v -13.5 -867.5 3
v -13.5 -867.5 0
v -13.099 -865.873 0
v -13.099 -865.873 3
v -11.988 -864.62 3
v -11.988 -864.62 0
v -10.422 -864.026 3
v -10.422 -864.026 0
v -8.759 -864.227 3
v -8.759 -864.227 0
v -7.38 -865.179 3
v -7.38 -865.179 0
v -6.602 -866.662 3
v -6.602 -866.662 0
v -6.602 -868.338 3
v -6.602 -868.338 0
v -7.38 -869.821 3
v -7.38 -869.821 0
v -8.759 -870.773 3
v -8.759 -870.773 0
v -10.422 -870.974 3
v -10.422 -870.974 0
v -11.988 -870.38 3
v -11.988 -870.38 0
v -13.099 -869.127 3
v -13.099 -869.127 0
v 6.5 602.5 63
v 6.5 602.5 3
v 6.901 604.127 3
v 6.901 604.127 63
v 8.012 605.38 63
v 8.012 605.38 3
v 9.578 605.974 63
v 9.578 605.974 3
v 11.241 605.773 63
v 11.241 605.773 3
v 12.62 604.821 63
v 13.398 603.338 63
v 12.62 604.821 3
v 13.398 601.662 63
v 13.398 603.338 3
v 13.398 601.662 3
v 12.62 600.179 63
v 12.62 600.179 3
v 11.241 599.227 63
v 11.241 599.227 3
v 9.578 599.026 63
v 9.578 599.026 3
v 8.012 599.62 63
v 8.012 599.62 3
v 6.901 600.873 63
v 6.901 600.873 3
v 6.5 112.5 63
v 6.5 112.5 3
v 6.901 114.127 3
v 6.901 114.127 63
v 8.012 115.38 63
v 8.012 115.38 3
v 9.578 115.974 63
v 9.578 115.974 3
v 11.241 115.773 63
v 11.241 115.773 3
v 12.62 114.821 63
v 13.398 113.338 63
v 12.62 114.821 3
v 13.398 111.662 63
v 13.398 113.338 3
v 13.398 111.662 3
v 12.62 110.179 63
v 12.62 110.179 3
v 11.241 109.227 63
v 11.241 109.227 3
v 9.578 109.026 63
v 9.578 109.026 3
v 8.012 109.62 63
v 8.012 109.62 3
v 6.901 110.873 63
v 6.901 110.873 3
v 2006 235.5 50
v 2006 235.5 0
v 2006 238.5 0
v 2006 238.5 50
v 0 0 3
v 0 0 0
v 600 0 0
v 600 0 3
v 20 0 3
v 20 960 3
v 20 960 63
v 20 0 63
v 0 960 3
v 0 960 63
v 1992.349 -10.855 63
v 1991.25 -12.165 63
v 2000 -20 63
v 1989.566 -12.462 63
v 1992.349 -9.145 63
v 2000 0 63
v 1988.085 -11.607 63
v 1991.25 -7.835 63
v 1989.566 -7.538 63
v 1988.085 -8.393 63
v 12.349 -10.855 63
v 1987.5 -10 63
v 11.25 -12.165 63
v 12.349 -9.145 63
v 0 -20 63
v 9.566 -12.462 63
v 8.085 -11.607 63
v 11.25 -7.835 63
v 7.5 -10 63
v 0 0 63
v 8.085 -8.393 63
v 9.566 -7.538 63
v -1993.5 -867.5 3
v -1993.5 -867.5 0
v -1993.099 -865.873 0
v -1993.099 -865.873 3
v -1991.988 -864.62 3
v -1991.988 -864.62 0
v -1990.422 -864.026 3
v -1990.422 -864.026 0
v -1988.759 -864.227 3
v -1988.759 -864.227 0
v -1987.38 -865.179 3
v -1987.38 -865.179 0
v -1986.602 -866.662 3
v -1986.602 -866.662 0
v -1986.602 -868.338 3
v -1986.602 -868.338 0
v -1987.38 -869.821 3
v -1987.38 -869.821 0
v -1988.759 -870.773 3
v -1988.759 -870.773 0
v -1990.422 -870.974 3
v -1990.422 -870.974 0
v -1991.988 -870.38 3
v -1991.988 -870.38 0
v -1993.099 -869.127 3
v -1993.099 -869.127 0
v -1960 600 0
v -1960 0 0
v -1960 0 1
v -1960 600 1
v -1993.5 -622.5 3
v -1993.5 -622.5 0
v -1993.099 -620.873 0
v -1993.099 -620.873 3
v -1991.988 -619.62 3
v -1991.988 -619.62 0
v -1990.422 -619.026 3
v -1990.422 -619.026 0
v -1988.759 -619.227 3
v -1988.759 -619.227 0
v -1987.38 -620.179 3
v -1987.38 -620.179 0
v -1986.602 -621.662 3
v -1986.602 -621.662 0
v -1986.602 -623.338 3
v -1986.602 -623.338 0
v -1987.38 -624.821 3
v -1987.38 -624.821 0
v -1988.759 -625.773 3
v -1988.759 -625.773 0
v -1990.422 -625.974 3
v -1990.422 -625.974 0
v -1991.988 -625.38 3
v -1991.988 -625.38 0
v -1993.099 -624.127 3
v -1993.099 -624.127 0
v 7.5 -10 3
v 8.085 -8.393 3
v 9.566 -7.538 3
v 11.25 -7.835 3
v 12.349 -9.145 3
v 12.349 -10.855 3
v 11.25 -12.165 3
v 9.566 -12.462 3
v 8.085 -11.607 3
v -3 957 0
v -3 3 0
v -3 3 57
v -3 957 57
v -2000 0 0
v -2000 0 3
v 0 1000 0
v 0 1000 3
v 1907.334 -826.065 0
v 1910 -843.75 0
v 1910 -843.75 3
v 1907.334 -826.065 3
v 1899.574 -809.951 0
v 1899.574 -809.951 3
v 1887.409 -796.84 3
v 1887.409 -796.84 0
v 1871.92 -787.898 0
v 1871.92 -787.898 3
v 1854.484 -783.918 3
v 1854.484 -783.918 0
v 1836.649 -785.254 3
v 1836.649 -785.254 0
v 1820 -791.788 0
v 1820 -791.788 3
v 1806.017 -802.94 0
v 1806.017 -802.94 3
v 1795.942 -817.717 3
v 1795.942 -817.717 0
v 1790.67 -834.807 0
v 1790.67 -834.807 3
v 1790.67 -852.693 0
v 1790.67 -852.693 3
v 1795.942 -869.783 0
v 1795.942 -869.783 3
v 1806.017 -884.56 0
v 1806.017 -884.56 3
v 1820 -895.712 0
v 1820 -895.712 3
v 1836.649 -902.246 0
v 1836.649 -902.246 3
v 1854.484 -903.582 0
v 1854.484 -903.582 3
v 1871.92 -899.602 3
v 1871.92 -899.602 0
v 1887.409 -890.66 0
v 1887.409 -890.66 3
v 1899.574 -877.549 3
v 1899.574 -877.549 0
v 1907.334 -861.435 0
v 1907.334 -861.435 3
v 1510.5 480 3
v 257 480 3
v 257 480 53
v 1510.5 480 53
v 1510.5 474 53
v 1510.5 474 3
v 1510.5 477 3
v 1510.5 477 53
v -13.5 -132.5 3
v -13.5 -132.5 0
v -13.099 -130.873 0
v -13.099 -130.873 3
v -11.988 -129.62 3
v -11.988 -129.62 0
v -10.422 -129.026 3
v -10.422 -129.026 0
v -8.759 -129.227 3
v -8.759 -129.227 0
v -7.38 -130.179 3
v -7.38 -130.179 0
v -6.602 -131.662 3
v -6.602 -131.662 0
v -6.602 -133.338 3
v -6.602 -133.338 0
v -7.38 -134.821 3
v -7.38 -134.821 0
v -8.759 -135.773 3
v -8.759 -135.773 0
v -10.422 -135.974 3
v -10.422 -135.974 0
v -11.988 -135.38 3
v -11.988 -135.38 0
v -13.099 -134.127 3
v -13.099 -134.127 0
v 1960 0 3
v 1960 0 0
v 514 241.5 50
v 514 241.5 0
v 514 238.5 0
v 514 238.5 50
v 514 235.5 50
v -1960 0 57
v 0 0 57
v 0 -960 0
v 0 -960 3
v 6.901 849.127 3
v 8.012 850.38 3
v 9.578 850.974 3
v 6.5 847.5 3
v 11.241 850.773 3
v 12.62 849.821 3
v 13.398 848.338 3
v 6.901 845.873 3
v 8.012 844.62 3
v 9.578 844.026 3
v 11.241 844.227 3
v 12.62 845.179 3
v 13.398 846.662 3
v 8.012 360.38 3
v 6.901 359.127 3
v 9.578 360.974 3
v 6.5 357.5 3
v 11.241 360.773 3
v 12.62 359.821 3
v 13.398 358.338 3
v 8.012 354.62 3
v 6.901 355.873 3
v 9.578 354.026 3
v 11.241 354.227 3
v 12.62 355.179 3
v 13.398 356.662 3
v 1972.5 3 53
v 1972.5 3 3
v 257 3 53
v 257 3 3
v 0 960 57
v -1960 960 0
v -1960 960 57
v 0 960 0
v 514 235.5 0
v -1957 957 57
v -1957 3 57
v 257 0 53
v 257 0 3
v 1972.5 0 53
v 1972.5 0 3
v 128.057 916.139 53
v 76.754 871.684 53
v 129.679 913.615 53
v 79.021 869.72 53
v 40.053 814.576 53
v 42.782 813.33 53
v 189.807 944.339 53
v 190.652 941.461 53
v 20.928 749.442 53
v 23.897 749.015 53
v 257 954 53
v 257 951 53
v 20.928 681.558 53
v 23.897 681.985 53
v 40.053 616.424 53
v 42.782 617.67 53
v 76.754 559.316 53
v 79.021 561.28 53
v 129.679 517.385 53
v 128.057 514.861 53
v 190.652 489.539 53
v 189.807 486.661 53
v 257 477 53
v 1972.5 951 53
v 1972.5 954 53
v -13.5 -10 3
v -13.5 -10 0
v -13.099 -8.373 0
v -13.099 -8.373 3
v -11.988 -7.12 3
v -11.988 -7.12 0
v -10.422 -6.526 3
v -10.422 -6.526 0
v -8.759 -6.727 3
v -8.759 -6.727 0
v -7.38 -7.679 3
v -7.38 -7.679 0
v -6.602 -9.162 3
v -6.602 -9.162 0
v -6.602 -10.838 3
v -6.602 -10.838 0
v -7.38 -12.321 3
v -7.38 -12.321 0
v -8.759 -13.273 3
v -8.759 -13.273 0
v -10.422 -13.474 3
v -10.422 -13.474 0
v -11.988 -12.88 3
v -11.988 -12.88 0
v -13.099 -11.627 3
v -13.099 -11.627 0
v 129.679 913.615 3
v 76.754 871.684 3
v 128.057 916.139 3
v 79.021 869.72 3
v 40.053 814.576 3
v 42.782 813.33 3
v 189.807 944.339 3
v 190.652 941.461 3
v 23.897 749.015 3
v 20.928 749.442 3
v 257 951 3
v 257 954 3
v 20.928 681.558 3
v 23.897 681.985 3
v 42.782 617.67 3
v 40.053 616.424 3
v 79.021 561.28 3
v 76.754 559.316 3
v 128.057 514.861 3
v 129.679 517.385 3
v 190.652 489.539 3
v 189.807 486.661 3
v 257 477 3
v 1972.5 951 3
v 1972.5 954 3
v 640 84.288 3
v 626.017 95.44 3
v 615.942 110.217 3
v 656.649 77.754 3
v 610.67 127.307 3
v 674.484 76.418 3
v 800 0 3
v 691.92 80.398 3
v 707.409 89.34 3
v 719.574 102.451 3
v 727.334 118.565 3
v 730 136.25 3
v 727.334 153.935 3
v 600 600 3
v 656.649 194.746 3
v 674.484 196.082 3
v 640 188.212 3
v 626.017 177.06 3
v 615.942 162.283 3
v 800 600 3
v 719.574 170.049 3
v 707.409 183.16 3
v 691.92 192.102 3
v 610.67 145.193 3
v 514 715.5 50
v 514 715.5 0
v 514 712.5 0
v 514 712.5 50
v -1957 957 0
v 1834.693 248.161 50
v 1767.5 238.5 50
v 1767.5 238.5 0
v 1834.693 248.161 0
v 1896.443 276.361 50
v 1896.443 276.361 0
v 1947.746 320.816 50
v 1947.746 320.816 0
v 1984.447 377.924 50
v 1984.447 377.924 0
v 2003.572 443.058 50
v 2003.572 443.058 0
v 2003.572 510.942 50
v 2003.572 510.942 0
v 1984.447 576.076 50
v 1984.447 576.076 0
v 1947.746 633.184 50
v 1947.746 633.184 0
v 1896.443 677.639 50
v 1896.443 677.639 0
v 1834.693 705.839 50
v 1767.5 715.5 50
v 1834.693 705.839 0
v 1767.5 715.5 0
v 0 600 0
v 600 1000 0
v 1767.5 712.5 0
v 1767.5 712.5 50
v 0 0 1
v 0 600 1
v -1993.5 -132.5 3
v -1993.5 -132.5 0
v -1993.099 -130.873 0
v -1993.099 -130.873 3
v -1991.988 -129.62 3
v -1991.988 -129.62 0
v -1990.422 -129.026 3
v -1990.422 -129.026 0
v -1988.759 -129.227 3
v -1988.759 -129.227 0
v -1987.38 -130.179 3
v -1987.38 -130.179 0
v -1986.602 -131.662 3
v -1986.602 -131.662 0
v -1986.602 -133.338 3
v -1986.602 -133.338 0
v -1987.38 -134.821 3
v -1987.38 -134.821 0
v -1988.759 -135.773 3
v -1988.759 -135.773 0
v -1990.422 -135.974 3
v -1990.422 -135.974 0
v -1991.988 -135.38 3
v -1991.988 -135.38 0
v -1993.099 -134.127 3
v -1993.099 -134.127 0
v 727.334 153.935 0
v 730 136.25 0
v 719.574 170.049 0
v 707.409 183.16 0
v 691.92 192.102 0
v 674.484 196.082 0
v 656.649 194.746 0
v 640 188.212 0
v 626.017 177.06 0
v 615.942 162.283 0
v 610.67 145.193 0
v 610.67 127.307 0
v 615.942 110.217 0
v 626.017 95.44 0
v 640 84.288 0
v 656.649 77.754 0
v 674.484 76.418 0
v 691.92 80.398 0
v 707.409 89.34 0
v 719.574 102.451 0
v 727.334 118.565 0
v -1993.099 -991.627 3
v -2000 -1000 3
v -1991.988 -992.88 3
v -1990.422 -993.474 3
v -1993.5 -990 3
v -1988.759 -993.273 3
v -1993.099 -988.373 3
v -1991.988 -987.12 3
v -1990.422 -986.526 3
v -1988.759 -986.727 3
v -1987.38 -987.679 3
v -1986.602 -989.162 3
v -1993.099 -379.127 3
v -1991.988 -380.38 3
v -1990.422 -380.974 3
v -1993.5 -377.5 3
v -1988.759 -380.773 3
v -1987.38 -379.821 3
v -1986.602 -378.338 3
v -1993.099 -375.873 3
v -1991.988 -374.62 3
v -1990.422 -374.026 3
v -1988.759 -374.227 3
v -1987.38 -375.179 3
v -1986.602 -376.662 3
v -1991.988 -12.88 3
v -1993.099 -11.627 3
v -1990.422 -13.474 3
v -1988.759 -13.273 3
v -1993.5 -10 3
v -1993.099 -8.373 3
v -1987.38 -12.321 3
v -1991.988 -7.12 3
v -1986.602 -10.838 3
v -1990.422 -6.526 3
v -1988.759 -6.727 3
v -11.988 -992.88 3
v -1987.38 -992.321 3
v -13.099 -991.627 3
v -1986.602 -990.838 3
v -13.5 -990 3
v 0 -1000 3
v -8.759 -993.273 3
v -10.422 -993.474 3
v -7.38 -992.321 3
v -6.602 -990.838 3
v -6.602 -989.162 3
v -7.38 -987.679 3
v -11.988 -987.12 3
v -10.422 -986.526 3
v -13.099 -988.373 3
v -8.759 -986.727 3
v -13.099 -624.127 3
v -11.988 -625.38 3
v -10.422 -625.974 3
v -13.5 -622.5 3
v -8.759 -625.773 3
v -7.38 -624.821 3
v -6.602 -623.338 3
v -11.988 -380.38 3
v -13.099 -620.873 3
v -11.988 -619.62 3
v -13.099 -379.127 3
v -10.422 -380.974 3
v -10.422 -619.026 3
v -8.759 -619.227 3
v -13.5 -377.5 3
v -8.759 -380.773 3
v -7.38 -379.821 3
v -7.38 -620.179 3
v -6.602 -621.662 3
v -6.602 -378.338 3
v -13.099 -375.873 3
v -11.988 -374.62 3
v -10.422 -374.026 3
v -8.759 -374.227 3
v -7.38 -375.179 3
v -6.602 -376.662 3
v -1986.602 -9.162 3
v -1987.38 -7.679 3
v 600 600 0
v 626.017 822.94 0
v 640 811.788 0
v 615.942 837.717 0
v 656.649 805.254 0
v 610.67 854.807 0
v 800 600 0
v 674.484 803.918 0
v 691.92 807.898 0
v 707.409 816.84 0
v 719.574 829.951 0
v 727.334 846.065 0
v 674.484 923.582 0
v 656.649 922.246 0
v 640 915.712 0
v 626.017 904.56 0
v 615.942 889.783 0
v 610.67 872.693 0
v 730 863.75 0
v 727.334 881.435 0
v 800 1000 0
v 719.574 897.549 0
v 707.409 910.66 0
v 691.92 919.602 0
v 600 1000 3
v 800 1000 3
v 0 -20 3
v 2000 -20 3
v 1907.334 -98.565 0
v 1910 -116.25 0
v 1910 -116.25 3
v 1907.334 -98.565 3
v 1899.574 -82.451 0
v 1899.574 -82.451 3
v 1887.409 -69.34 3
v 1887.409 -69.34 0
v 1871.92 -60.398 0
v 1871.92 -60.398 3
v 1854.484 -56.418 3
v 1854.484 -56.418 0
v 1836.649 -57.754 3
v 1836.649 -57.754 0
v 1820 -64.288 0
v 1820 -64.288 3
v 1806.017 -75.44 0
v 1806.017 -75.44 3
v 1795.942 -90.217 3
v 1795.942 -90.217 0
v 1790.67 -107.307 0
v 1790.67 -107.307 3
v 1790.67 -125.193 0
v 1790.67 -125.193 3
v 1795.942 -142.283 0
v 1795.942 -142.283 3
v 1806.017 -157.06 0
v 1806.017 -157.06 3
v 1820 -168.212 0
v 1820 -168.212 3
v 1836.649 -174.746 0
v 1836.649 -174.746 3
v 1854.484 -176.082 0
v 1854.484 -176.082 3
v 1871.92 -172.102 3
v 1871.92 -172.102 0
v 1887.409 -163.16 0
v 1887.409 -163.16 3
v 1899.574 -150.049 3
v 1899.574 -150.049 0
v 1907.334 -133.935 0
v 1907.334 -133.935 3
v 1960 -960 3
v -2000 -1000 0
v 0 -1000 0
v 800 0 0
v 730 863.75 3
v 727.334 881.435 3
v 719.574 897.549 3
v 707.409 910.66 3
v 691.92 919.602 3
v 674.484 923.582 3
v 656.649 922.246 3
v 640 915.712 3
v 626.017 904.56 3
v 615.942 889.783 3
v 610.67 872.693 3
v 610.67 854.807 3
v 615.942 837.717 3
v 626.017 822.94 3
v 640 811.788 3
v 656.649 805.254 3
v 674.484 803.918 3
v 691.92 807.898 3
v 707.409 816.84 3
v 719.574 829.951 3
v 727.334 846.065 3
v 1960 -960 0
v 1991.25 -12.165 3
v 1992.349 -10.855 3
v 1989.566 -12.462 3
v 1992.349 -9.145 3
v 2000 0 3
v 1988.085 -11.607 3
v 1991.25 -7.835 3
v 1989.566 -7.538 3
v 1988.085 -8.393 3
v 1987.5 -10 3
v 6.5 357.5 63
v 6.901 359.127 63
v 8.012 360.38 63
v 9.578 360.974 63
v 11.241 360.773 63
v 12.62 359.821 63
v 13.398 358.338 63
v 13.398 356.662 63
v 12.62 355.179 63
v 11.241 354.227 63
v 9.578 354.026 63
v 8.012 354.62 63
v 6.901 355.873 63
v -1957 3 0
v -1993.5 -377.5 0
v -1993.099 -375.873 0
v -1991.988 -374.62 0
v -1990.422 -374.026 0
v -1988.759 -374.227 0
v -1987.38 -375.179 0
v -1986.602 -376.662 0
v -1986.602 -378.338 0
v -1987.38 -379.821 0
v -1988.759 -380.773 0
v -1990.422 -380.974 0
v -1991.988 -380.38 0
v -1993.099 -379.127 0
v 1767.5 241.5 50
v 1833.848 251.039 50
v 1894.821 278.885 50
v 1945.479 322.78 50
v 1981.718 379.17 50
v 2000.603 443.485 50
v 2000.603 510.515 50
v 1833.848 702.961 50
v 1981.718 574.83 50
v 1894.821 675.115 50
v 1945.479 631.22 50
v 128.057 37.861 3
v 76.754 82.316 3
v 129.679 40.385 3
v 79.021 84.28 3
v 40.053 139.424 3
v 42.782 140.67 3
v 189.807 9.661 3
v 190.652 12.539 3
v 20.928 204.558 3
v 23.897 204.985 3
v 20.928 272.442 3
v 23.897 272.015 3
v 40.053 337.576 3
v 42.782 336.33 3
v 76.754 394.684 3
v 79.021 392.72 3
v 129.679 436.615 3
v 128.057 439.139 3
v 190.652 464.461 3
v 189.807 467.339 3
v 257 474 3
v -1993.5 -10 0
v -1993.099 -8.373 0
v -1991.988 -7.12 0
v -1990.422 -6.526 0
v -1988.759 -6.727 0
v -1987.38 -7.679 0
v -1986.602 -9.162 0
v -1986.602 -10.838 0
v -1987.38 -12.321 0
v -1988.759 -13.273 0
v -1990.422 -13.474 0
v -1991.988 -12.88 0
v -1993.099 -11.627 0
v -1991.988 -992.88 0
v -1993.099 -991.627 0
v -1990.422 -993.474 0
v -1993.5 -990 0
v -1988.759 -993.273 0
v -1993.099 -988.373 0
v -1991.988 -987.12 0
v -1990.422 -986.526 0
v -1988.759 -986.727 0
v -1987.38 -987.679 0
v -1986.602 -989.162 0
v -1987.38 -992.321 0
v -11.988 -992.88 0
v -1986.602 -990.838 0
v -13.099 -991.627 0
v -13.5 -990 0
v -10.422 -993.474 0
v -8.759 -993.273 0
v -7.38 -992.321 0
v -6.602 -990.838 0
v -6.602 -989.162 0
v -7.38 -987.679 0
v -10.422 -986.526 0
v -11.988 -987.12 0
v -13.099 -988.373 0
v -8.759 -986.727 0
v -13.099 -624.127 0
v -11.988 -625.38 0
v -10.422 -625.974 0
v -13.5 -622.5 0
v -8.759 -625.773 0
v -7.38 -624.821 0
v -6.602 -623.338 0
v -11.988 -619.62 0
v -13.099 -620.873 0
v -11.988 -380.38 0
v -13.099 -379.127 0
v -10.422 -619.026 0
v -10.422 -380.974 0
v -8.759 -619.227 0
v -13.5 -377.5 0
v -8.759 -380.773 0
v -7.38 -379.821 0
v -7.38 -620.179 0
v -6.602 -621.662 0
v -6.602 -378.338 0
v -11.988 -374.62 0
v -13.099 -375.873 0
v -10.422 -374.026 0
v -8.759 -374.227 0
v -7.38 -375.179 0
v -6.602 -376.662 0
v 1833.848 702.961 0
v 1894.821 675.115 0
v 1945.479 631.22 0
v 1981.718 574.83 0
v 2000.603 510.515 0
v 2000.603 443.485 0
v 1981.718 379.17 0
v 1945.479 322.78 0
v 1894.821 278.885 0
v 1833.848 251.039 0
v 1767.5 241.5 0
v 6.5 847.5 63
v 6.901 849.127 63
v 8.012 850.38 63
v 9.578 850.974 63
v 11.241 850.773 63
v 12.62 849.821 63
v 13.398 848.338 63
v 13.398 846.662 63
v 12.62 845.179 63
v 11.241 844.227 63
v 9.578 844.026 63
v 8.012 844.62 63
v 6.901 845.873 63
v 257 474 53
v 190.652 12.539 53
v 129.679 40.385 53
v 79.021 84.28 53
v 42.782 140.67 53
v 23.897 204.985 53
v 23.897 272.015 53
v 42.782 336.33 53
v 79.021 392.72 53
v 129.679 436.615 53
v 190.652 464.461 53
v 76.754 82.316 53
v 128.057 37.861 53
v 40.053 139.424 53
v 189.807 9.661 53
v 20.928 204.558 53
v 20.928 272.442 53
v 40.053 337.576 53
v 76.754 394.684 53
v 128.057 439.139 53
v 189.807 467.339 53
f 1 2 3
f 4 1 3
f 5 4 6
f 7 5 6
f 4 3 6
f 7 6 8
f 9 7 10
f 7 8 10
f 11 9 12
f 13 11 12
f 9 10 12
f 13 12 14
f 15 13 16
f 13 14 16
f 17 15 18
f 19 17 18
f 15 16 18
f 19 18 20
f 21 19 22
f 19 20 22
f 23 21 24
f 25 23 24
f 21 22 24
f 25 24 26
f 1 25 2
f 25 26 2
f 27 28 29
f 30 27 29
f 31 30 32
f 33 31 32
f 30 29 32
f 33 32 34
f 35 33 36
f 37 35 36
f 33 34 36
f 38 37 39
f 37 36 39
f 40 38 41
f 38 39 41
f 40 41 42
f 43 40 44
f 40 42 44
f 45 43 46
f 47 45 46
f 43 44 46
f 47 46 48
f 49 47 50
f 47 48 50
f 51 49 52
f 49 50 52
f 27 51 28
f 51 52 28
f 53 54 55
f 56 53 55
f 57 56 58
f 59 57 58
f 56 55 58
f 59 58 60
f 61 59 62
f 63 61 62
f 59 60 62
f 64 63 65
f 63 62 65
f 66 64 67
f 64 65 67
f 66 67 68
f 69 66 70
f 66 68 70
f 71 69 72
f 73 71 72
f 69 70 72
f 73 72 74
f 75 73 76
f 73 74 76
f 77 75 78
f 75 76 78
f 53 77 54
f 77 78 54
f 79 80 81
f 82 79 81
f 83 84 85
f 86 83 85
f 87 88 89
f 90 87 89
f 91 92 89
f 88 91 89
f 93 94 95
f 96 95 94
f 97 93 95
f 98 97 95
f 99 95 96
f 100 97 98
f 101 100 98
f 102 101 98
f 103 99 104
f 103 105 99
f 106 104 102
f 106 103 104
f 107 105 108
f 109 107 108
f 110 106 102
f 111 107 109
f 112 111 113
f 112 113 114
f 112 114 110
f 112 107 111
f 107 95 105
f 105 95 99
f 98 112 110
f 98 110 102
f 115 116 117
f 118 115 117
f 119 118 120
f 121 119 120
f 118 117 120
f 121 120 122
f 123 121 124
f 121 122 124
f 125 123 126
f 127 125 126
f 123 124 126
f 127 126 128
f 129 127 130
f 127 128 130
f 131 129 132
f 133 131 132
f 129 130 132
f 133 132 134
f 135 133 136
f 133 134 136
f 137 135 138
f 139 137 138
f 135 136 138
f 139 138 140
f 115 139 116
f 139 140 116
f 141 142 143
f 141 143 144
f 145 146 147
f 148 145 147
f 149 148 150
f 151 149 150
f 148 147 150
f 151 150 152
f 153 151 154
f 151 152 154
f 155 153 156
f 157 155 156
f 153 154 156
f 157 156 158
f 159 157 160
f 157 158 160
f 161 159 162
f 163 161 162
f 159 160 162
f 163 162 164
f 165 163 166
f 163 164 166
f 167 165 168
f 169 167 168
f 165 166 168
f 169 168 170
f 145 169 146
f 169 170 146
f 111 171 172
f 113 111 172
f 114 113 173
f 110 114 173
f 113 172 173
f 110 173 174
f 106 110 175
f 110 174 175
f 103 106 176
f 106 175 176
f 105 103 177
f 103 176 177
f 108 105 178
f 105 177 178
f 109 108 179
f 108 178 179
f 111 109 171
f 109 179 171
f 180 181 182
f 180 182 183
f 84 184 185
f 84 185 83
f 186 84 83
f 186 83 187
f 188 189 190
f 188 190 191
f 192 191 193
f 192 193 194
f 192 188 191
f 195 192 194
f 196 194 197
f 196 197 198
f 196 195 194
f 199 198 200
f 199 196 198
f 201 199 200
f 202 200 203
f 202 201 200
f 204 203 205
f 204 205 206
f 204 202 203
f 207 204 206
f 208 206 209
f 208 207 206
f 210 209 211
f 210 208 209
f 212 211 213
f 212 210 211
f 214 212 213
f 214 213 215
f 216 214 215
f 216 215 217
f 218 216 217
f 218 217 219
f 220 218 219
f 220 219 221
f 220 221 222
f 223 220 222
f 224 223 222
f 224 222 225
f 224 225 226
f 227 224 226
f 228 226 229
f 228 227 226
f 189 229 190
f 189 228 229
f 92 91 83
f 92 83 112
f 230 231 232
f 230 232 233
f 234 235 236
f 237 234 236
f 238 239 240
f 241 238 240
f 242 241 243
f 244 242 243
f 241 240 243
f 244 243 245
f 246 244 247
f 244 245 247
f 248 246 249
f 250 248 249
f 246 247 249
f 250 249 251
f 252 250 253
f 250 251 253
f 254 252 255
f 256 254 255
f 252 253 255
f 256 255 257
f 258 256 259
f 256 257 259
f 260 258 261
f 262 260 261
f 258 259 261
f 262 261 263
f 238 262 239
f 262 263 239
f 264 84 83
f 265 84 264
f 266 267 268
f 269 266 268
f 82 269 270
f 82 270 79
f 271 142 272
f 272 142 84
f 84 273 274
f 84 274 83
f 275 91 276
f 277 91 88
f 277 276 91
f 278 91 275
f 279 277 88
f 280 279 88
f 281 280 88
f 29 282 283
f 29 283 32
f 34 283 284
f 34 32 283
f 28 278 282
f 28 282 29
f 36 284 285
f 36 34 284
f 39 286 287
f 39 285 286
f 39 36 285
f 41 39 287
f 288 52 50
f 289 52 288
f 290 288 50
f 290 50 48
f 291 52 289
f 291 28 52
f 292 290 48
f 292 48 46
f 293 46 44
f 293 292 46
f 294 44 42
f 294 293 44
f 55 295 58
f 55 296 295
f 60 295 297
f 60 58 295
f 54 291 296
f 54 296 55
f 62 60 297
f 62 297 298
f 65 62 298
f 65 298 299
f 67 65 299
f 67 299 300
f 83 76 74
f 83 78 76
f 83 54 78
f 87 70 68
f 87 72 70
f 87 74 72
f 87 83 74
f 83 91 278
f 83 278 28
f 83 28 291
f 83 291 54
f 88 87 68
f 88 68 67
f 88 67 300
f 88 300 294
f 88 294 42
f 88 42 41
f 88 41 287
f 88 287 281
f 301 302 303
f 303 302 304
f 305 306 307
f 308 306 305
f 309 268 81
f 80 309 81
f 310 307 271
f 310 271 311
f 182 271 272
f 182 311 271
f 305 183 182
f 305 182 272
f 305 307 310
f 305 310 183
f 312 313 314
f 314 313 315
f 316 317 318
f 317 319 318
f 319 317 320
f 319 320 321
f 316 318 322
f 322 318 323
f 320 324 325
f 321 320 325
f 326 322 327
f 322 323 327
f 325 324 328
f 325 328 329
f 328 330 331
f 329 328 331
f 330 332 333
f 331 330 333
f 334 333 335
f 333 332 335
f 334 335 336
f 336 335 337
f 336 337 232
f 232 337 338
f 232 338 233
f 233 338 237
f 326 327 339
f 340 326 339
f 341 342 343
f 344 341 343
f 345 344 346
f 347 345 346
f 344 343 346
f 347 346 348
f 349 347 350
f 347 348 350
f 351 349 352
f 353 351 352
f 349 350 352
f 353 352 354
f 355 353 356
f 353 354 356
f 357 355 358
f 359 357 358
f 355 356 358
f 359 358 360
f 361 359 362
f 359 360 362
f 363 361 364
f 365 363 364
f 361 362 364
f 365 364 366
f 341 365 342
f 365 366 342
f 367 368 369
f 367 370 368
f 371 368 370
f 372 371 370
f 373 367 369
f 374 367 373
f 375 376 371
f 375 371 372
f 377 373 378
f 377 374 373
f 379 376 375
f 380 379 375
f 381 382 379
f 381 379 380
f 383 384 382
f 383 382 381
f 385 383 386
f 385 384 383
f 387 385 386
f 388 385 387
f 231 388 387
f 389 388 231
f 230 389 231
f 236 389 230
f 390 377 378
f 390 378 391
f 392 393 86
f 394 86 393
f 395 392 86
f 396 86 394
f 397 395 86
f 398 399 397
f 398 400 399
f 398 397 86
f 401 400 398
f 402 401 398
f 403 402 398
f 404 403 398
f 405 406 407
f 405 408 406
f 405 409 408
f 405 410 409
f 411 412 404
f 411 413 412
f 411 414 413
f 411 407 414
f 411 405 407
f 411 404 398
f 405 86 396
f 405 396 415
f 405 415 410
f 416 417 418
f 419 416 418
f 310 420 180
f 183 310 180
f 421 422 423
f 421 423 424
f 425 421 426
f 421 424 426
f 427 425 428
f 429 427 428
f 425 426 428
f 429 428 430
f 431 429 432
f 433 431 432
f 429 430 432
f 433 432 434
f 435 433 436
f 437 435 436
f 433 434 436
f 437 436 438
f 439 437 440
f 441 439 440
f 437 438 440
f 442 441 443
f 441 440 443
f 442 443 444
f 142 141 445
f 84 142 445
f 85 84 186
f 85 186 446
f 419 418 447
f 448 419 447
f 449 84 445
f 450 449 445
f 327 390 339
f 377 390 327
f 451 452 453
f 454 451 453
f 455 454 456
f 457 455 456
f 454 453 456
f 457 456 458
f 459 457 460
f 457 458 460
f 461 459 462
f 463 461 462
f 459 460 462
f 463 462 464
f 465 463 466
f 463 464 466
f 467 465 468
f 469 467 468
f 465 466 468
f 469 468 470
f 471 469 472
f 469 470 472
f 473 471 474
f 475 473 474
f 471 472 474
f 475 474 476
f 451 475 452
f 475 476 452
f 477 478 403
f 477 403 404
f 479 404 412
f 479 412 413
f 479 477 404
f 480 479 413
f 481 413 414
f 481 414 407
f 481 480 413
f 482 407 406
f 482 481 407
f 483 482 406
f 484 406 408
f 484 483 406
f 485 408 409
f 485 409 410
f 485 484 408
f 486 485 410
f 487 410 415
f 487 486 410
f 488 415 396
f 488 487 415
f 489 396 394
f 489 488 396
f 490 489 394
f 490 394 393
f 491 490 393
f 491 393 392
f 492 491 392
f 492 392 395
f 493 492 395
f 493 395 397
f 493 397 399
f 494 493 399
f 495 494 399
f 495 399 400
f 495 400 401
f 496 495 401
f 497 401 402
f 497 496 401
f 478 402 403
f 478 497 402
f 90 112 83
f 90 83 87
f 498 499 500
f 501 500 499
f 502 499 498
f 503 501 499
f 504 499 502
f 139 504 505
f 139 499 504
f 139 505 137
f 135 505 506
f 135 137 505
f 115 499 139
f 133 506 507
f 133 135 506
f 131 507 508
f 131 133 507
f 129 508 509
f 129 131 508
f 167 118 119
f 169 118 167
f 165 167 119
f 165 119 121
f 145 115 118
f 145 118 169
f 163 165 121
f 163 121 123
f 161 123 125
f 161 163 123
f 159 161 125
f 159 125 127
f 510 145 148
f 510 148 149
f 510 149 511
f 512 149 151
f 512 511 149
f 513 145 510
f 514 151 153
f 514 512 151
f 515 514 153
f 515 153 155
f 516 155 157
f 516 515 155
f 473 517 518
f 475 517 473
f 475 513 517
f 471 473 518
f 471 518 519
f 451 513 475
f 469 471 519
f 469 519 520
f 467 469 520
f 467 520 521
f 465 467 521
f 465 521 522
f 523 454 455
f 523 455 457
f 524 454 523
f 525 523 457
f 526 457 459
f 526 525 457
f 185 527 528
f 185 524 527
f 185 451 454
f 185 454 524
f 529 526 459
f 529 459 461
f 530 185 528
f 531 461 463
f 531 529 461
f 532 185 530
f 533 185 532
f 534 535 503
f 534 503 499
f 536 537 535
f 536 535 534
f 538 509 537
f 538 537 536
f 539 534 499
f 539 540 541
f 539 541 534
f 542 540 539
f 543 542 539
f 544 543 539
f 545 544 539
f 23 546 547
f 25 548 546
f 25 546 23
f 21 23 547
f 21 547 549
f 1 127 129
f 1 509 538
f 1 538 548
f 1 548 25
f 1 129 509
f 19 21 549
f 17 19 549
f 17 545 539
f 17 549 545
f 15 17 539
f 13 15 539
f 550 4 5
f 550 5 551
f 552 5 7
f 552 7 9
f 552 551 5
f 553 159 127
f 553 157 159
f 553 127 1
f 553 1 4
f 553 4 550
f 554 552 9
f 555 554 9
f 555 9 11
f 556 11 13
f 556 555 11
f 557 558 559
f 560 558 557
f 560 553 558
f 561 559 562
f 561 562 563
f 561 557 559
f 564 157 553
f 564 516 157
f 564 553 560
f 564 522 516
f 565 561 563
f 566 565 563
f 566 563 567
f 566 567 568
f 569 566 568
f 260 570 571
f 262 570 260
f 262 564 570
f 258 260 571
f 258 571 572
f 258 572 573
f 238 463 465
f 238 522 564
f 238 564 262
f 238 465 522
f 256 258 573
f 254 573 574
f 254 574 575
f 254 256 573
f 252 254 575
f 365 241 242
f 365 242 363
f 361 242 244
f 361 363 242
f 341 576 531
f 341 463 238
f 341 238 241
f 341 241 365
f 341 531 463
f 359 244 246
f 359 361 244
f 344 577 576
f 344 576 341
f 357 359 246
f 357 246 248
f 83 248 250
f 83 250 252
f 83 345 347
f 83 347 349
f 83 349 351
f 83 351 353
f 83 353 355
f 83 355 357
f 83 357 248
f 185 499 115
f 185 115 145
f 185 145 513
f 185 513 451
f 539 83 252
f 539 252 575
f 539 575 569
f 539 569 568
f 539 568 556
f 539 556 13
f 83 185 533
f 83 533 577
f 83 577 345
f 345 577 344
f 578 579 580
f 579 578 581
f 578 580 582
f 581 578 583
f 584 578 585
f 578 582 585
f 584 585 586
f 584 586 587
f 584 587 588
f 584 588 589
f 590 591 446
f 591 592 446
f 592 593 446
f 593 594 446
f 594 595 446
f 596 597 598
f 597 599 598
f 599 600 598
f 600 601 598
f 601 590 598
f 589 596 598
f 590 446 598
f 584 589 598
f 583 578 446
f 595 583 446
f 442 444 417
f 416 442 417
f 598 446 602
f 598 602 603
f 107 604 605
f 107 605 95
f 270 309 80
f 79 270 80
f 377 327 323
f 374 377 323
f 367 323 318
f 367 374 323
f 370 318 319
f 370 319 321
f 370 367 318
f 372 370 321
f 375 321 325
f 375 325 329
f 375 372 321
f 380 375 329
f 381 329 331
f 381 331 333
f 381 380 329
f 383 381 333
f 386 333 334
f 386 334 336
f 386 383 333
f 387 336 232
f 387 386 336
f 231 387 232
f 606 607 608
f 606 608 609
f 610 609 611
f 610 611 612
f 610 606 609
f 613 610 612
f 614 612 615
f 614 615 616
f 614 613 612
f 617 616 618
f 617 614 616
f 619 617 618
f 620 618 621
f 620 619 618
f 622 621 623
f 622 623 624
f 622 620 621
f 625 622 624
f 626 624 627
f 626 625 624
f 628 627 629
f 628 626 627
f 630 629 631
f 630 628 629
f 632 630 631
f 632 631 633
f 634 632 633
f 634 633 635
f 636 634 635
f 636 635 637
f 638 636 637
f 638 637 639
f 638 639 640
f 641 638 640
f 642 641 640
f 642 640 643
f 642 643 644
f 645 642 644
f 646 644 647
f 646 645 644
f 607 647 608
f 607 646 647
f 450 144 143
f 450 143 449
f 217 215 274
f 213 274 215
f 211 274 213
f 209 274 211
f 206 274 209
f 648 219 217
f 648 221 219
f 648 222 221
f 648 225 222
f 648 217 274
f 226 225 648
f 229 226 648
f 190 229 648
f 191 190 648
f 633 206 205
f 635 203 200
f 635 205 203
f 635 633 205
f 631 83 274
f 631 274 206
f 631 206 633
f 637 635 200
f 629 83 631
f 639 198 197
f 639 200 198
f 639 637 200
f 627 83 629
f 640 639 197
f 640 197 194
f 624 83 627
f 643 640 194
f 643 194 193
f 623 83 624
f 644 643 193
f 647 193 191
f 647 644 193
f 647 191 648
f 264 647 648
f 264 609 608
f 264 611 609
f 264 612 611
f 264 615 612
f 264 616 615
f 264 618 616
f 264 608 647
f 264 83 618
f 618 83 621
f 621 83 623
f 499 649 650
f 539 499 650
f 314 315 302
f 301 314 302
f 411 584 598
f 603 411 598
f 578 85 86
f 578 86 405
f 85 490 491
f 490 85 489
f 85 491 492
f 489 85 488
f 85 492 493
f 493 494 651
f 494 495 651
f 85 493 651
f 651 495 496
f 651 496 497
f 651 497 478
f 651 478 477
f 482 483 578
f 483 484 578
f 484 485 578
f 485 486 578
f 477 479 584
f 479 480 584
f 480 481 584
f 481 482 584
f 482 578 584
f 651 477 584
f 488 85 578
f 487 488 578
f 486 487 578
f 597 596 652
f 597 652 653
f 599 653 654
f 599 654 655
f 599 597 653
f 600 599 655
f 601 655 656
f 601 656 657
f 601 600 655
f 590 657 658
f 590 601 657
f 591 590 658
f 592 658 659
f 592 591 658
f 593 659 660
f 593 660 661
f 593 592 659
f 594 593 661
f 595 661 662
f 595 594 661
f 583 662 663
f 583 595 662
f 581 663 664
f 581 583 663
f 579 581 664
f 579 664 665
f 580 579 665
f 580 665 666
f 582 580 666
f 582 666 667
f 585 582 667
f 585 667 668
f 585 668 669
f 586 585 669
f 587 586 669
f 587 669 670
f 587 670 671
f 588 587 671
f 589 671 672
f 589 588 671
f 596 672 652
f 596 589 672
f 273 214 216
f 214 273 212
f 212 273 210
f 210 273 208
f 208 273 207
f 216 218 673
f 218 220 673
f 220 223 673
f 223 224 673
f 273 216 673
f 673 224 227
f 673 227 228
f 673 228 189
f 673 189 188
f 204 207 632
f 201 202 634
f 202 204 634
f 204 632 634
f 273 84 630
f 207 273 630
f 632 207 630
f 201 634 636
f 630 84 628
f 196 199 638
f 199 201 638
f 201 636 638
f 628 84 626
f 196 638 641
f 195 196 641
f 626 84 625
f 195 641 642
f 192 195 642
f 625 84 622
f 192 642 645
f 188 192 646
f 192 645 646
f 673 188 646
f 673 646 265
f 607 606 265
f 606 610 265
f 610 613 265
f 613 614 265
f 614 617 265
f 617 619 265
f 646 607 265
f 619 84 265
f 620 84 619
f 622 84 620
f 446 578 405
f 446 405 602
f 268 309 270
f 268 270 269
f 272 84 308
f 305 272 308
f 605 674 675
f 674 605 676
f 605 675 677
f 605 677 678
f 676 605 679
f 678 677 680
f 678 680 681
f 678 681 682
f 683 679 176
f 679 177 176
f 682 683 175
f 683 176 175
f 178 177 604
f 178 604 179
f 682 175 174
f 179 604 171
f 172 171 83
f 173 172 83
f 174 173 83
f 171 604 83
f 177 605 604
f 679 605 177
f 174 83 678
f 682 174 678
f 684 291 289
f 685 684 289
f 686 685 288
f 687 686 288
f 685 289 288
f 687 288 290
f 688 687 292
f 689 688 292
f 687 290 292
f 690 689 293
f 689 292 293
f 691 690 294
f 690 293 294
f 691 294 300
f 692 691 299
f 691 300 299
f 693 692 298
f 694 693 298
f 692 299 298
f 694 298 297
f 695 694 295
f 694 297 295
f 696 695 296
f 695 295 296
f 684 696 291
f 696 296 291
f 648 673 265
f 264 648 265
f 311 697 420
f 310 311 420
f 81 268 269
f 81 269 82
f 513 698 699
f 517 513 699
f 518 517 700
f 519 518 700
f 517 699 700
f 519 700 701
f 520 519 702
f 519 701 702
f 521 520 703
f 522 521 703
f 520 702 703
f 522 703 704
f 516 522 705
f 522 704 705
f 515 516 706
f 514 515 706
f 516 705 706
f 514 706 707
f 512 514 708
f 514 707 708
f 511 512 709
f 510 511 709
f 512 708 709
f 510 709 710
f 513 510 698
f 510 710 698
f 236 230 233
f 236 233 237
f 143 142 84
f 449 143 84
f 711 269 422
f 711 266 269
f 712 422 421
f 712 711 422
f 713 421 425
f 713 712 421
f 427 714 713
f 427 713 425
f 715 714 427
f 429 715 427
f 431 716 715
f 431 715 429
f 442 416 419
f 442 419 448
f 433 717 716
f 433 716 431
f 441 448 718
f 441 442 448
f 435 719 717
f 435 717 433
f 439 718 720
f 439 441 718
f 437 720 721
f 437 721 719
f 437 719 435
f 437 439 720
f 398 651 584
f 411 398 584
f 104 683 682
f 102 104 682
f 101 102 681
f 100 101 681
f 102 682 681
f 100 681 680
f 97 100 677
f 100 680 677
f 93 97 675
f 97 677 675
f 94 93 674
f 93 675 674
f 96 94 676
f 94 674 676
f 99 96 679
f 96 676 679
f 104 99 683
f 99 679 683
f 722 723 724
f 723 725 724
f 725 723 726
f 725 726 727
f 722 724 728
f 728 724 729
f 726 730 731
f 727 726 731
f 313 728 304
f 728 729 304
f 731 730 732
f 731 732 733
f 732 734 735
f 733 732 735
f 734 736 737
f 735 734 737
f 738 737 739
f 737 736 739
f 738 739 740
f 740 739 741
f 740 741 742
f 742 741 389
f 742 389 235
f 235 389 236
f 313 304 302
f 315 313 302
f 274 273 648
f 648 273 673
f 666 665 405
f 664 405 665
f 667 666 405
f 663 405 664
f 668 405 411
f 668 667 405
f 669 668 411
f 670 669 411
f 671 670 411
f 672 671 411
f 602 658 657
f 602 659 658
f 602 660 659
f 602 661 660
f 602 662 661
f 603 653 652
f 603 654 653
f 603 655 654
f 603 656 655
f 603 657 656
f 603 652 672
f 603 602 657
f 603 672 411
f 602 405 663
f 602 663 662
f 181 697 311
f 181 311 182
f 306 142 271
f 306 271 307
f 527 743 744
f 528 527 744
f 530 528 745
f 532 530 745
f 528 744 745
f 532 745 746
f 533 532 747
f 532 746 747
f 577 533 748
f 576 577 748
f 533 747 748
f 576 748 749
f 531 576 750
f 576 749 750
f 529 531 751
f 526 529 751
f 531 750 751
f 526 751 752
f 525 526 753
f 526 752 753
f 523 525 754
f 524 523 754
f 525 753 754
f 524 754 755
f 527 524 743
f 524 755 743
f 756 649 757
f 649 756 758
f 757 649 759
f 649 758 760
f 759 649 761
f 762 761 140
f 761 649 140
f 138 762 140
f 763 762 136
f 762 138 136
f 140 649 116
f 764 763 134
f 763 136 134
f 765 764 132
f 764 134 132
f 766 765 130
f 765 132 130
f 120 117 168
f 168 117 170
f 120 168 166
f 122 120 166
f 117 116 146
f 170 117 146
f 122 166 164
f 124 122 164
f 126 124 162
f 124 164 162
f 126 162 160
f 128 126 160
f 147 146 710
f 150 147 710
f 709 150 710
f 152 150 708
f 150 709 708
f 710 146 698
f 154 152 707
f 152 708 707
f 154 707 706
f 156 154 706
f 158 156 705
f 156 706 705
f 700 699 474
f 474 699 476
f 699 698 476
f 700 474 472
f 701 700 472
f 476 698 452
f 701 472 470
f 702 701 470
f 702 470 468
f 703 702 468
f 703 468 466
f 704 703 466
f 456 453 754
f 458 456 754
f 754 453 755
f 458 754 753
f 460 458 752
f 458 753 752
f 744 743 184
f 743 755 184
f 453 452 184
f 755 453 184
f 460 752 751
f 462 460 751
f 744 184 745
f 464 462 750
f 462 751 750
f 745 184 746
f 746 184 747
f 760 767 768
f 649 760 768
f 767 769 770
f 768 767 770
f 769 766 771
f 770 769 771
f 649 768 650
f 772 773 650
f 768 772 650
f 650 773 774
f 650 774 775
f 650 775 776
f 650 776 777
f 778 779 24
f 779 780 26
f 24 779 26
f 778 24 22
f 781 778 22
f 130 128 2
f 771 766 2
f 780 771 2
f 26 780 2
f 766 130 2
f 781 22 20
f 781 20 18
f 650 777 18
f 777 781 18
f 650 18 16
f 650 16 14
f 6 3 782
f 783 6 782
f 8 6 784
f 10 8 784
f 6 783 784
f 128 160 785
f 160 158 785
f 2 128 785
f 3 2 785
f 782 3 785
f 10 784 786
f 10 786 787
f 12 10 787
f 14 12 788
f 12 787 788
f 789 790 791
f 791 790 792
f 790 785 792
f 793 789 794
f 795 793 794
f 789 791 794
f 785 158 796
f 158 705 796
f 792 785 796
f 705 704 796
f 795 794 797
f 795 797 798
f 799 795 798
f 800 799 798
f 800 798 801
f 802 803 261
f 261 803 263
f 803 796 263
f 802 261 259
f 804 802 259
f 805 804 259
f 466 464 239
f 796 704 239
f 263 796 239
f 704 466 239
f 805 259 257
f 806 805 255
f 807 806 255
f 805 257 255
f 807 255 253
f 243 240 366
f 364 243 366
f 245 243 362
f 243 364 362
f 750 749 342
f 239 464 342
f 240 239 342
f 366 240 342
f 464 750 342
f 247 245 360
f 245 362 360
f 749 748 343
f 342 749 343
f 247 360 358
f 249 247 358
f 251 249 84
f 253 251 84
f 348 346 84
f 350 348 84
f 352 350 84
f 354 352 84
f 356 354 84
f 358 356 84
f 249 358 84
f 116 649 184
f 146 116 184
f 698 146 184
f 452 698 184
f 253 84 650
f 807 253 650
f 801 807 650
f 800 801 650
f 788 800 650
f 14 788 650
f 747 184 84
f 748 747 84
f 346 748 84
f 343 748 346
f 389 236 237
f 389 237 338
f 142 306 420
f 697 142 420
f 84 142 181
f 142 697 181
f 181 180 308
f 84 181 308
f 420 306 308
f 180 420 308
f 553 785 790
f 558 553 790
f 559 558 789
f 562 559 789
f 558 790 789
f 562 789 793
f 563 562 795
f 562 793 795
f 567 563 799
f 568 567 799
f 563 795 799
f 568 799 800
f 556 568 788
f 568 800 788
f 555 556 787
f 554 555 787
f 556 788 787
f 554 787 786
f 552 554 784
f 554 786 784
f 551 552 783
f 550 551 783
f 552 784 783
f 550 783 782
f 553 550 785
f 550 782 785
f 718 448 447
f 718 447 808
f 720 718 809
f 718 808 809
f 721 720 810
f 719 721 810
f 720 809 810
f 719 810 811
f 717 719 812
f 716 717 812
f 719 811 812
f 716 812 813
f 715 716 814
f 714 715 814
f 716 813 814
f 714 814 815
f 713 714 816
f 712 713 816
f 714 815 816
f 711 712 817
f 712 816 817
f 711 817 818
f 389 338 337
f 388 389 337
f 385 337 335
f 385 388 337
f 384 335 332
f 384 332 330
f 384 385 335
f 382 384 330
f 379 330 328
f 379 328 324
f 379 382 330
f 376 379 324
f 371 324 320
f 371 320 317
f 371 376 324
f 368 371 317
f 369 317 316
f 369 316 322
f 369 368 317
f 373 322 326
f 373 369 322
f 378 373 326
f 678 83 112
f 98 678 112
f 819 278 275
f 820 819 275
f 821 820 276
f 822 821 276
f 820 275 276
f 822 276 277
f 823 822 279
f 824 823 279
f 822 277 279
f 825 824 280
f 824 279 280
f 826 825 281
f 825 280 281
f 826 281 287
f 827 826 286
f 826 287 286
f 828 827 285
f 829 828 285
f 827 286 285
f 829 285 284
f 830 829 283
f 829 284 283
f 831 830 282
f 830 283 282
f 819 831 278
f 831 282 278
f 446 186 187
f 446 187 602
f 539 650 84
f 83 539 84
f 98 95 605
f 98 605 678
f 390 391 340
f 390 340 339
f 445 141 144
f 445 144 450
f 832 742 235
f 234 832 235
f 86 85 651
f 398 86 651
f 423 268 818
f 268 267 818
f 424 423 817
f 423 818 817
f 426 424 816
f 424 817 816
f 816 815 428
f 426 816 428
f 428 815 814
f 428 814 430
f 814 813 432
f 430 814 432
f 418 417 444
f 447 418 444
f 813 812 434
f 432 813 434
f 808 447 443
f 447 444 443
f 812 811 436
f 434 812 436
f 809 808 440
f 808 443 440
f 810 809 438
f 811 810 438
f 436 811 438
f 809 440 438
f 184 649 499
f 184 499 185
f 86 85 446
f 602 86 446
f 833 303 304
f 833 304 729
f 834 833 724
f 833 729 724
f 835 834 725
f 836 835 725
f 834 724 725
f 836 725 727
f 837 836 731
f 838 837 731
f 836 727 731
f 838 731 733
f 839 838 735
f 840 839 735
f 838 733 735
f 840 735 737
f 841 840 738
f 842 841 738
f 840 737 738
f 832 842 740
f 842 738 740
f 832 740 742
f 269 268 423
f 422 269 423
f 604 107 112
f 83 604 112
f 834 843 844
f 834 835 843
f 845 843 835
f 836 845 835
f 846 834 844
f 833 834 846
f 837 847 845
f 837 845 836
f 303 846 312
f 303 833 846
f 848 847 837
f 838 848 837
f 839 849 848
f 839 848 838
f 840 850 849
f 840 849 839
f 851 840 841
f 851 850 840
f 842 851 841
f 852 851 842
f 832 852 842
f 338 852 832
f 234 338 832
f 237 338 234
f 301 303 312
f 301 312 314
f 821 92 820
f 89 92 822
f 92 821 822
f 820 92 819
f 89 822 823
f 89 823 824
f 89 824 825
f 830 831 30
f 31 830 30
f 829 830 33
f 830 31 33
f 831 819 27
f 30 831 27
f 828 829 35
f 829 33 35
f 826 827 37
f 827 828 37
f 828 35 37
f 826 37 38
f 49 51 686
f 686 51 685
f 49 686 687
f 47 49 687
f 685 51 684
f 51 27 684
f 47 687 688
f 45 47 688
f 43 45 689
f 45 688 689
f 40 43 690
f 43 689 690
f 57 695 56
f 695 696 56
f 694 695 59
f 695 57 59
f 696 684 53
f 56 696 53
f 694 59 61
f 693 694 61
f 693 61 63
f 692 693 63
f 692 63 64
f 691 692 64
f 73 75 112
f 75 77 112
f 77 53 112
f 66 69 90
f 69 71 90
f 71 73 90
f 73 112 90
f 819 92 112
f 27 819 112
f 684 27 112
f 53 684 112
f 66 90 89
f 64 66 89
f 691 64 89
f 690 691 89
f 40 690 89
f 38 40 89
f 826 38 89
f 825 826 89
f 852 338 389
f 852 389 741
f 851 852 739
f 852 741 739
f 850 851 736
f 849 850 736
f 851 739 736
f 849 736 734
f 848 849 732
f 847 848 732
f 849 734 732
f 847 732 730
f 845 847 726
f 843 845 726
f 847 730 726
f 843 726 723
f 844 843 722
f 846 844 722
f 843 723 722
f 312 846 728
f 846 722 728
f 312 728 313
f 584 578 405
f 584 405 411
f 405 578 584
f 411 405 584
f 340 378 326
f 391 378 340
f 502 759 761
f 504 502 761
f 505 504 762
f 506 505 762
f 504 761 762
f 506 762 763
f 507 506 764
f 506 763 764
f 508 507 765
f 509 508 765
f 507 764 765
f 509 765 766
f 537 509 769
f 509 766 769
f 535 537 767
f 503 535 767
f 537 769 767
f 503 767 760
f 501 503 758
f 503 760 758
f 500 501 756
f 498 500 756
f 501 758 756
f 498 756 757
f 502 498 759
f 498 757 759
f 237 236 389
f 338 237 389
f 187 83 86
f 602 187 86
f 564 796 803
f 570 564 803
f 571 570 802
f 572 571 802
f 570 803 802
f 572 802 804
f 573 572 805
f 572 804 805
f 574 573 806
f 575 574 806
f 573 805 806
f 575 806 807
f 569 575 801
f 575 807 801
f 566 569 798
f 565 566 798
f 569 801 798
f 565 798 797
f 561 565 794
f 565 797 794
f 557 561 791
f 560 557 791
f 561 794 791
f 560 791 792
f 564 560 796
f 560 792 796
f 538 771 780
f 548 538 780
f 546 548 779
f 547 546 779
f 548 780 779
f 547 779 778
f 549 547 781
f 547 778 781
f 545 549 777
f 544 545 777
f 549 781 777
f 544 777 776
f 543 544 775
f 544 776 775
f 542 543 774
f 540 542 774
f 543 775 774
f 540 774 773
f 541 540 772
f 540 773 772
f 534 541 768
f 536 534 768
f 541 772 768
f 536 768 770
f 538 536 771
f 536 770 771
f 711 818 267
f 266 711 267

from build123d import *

# Parameters (mm, degrees)
F0_W      = 600
F0_H      = 1000
F1_DEPTH  = 3
F2_W      = 200
F2_H      = 600
F2_R      = 60
F3_DEPTH  = 3
F4_W      = 200
F4_H      = 400
F4_R      = 60
F5_DEPTH  = 3
F6_W      = 910.5
F6_H      = 3
F6_W_2    = 1372.5
F7_DEPTH  = 50
F10_DEPTH = 50
F11_W     = 1960
F11_H     = 960
F11_R     = 60
F12_DEPTH = 3
F13_W     = 1960
F13_H     = 600
F14_DEPTH = 1
F15_W     = 20
F15_H     = 60
F16_DEPTH = 2000
F18_D     = 5
F19_W     = 20
F19_H     = 60
F20_DEPTH = 960
F22_D     = 7
F23_W     = 2000
F23_H     = 1000
F24_DEPTH = 3
F26_D     = 7
F27_W     = 1960
F27_H     = 960
F27_W_2   = 1954
F27_H_2   = 954
F28_DEPTH = 57
F29_W     = 1492
F29_H     = 3
F30_DEPTH = 50


with BuildPart() as f1:
    # F0 (on Top) → F1 (new body)
    with BuildSketch(Plane.XY):
        with Locations((300, 500)):
            Rectangle(F0_W, F0_H)
    extrude(amount=F1_DEPTH)


with BuildPart() as f3:
    # F2 (on Top) → F3 (new body)
    with BuildSketch(Plane.XY):
        with Locations((700, 300)):
            Rectangle(F2_W, F2_H)
        with Locations((670, 136.25)):
            Circle(F2_R, mode=Mode.SUBTRACT)
    extrude(amount=F3_DEPTH)


with BuildPart() as f5:
    # F4 (on Top) → F5 (new body)
    with BuildSketch(Plane.XY):
        with Locations((700, 800)):
            Rectangle(F4_W, F4_H)
        with Locations((670, 863.75)):
            Circle(F4_R, mode=Mode.SUBTRACT)
    extrude(amount=F5_DEPTH)


with BuildPart() as f7:
    # F6 (on face) → F7 (new body)
    with BuildSketch(Plane.XY.offset(3)):
        with Locations((1055.25, 475.5)):
            Rectangle(F6_W, F6_H)
        with BuildLine():
            Line((600, 477), (257, 477))
            ThreePointArc((257, 477), (18.5, 238.5), (257, 0))
            Line((257, 0), (600, 0))
            Line((600, 0), (600, 3))
            Line((600, 3), (257, 3))
            ThreePointArc((257, 3), (21.5, 238.5), (257, 474))
            Line((257, 474), (600, 474))
            Line((600, 474), (600, 477))
        make_face()
        with Locations((1286.25, 1.5)):
            Rectangle(F6_W_2, F6_H)
    extrude(amount=F7_DEPTH)


with BuildPart() as f8_1:
    # F8: instance of F7
    add(f7.part.mirror(Plane(origin=(883.75, 477, 28), x_dir=(-1, 0, 0), z_dir=(0, 1, 0))))


with BuildPart() as f10:
    # F9 (on Top) → F10 (new body)
    with BuildSketch(Plane.XY):
        with BuildLine():
            Line((514, 238.5), (1767.5, 238.5))
            ThreePointArc((1767.5, 238.5), (2006, 477), (1767.5, 715.5))
            Line((1767.5, 715.5), (514, 715.5))
            Line((514, 715.5), (514, 712.5))
            Line((514, 712.5), (1767.5, 712.5))
            ThreePointArc((1767.5, 712.5), (2003, 477), (1767.5, 241.5))
            Line((1767.5, 241.5), (514, 241.5))
            Line((514, 241.5), (514, 238.5))
        make_face()
    extrude(amount=F10_DEPTH)


with BuildPart() as f12:
    # F11 (on Top) → F12 (new body)
    with BuildSketch(Plane.XY):
        with Locations((980, -480)):
            Rectangle(F11_W, F11_H)
        with Locations((1850, -843.75)):
            Circle(F11_R, mode=Mode.SUBTRACT)
        with Locations((1850, -116.25)):
            Circle(F11_R, mode=Mode.SUBTRACT)
    extrude(amount=F12_DEPTH)


with BuildPart() as f14:
    # F13 (on Top) → F14 (new body)
    with BuildSketch(Plane.XY):
        with Locations((-980, 300)):
            Rectangle(F13_W, F13_H)
    extrude(amount=F14_DEPTH)


with BuildPart() as f16:
    # F15 (on Right) → F16 (new body)
    with BuildSketch(Plane.YZ):
        with Locations((-10, 33)):
            Rectangle(F15_W, F15_H)
    extrude(amount=F16_DEPTH)

    # F18 (through all)
    with Locations(Plane.XY.offset(63)):
        with Locations((10, -10), (1990, -10)):
            Hole(F18_D / 2)


with BuildPart() as f20:
    # F19 (on Front) → F20 (new body)
    with BuildSketch(Plane.XZ):
        with Locations((10, 33)):
            Rectangle(F19_W, F19_H)
    extrude(amount=-F20_DEPTH)

    # F22 (through all)
    with Locations(Plane.XY.offset(63)):
        with Locations((10, 112.5), (10, 357.5), (10, 602.5), (10, 847.5)):
            Hole(F22_D / 2)


with BuildPart() as f24:
    # F23 (on Top) → F24 (new body)
    with BuildSketch(Plane.XY):
        with Locations((-1000, -500)):
            Rectangle(F23_W, F23_H)
    extrude(amount=F24_DEPTH)

    # F26 (through all)
    with Locations(Plane.XY.offset(3)):
        with Locations((-1990, -990), (-1990, -867.5), (-1990, -622.5), (-1990, -377.5), (-1990, -132.5), (-1990, -10), (-10, -10), (-10, -990), (-10, -867.5), (-10, -622.5), (-10, -377.5), (-10, -132.5)):
            Hole(F26_D / 2)


with BuildPart() as f28:
    # F27 (on Top) → F28 (new body)
    with BuildSketch(Plane.XY):
        with Locations((-980, 480)):
            Rectangle(F27_W, F27_H)
        with Locations((-980, 480)):
            Rectangle(F27_W_2, F27_H_2, mode=Mode.SUBTRACT)
    extrude(amount=F28_DEPTH)


with BuildPart() as f30:
    # F29 (on Top) → F30 (new body)
    with BuildSketch(Plane.XY):
        with Locations((1260, 237)):
            Rectangle(F29_W, F29_H)
    extrude(amount=F30_DEPTH)


solid = Compound([f1.part, f3.part, f5.part, f7.part, f8_1.part, f10.part, f12.part, f14.part, f16.part, f20.part, f24.part, f28.part, f30.part])
